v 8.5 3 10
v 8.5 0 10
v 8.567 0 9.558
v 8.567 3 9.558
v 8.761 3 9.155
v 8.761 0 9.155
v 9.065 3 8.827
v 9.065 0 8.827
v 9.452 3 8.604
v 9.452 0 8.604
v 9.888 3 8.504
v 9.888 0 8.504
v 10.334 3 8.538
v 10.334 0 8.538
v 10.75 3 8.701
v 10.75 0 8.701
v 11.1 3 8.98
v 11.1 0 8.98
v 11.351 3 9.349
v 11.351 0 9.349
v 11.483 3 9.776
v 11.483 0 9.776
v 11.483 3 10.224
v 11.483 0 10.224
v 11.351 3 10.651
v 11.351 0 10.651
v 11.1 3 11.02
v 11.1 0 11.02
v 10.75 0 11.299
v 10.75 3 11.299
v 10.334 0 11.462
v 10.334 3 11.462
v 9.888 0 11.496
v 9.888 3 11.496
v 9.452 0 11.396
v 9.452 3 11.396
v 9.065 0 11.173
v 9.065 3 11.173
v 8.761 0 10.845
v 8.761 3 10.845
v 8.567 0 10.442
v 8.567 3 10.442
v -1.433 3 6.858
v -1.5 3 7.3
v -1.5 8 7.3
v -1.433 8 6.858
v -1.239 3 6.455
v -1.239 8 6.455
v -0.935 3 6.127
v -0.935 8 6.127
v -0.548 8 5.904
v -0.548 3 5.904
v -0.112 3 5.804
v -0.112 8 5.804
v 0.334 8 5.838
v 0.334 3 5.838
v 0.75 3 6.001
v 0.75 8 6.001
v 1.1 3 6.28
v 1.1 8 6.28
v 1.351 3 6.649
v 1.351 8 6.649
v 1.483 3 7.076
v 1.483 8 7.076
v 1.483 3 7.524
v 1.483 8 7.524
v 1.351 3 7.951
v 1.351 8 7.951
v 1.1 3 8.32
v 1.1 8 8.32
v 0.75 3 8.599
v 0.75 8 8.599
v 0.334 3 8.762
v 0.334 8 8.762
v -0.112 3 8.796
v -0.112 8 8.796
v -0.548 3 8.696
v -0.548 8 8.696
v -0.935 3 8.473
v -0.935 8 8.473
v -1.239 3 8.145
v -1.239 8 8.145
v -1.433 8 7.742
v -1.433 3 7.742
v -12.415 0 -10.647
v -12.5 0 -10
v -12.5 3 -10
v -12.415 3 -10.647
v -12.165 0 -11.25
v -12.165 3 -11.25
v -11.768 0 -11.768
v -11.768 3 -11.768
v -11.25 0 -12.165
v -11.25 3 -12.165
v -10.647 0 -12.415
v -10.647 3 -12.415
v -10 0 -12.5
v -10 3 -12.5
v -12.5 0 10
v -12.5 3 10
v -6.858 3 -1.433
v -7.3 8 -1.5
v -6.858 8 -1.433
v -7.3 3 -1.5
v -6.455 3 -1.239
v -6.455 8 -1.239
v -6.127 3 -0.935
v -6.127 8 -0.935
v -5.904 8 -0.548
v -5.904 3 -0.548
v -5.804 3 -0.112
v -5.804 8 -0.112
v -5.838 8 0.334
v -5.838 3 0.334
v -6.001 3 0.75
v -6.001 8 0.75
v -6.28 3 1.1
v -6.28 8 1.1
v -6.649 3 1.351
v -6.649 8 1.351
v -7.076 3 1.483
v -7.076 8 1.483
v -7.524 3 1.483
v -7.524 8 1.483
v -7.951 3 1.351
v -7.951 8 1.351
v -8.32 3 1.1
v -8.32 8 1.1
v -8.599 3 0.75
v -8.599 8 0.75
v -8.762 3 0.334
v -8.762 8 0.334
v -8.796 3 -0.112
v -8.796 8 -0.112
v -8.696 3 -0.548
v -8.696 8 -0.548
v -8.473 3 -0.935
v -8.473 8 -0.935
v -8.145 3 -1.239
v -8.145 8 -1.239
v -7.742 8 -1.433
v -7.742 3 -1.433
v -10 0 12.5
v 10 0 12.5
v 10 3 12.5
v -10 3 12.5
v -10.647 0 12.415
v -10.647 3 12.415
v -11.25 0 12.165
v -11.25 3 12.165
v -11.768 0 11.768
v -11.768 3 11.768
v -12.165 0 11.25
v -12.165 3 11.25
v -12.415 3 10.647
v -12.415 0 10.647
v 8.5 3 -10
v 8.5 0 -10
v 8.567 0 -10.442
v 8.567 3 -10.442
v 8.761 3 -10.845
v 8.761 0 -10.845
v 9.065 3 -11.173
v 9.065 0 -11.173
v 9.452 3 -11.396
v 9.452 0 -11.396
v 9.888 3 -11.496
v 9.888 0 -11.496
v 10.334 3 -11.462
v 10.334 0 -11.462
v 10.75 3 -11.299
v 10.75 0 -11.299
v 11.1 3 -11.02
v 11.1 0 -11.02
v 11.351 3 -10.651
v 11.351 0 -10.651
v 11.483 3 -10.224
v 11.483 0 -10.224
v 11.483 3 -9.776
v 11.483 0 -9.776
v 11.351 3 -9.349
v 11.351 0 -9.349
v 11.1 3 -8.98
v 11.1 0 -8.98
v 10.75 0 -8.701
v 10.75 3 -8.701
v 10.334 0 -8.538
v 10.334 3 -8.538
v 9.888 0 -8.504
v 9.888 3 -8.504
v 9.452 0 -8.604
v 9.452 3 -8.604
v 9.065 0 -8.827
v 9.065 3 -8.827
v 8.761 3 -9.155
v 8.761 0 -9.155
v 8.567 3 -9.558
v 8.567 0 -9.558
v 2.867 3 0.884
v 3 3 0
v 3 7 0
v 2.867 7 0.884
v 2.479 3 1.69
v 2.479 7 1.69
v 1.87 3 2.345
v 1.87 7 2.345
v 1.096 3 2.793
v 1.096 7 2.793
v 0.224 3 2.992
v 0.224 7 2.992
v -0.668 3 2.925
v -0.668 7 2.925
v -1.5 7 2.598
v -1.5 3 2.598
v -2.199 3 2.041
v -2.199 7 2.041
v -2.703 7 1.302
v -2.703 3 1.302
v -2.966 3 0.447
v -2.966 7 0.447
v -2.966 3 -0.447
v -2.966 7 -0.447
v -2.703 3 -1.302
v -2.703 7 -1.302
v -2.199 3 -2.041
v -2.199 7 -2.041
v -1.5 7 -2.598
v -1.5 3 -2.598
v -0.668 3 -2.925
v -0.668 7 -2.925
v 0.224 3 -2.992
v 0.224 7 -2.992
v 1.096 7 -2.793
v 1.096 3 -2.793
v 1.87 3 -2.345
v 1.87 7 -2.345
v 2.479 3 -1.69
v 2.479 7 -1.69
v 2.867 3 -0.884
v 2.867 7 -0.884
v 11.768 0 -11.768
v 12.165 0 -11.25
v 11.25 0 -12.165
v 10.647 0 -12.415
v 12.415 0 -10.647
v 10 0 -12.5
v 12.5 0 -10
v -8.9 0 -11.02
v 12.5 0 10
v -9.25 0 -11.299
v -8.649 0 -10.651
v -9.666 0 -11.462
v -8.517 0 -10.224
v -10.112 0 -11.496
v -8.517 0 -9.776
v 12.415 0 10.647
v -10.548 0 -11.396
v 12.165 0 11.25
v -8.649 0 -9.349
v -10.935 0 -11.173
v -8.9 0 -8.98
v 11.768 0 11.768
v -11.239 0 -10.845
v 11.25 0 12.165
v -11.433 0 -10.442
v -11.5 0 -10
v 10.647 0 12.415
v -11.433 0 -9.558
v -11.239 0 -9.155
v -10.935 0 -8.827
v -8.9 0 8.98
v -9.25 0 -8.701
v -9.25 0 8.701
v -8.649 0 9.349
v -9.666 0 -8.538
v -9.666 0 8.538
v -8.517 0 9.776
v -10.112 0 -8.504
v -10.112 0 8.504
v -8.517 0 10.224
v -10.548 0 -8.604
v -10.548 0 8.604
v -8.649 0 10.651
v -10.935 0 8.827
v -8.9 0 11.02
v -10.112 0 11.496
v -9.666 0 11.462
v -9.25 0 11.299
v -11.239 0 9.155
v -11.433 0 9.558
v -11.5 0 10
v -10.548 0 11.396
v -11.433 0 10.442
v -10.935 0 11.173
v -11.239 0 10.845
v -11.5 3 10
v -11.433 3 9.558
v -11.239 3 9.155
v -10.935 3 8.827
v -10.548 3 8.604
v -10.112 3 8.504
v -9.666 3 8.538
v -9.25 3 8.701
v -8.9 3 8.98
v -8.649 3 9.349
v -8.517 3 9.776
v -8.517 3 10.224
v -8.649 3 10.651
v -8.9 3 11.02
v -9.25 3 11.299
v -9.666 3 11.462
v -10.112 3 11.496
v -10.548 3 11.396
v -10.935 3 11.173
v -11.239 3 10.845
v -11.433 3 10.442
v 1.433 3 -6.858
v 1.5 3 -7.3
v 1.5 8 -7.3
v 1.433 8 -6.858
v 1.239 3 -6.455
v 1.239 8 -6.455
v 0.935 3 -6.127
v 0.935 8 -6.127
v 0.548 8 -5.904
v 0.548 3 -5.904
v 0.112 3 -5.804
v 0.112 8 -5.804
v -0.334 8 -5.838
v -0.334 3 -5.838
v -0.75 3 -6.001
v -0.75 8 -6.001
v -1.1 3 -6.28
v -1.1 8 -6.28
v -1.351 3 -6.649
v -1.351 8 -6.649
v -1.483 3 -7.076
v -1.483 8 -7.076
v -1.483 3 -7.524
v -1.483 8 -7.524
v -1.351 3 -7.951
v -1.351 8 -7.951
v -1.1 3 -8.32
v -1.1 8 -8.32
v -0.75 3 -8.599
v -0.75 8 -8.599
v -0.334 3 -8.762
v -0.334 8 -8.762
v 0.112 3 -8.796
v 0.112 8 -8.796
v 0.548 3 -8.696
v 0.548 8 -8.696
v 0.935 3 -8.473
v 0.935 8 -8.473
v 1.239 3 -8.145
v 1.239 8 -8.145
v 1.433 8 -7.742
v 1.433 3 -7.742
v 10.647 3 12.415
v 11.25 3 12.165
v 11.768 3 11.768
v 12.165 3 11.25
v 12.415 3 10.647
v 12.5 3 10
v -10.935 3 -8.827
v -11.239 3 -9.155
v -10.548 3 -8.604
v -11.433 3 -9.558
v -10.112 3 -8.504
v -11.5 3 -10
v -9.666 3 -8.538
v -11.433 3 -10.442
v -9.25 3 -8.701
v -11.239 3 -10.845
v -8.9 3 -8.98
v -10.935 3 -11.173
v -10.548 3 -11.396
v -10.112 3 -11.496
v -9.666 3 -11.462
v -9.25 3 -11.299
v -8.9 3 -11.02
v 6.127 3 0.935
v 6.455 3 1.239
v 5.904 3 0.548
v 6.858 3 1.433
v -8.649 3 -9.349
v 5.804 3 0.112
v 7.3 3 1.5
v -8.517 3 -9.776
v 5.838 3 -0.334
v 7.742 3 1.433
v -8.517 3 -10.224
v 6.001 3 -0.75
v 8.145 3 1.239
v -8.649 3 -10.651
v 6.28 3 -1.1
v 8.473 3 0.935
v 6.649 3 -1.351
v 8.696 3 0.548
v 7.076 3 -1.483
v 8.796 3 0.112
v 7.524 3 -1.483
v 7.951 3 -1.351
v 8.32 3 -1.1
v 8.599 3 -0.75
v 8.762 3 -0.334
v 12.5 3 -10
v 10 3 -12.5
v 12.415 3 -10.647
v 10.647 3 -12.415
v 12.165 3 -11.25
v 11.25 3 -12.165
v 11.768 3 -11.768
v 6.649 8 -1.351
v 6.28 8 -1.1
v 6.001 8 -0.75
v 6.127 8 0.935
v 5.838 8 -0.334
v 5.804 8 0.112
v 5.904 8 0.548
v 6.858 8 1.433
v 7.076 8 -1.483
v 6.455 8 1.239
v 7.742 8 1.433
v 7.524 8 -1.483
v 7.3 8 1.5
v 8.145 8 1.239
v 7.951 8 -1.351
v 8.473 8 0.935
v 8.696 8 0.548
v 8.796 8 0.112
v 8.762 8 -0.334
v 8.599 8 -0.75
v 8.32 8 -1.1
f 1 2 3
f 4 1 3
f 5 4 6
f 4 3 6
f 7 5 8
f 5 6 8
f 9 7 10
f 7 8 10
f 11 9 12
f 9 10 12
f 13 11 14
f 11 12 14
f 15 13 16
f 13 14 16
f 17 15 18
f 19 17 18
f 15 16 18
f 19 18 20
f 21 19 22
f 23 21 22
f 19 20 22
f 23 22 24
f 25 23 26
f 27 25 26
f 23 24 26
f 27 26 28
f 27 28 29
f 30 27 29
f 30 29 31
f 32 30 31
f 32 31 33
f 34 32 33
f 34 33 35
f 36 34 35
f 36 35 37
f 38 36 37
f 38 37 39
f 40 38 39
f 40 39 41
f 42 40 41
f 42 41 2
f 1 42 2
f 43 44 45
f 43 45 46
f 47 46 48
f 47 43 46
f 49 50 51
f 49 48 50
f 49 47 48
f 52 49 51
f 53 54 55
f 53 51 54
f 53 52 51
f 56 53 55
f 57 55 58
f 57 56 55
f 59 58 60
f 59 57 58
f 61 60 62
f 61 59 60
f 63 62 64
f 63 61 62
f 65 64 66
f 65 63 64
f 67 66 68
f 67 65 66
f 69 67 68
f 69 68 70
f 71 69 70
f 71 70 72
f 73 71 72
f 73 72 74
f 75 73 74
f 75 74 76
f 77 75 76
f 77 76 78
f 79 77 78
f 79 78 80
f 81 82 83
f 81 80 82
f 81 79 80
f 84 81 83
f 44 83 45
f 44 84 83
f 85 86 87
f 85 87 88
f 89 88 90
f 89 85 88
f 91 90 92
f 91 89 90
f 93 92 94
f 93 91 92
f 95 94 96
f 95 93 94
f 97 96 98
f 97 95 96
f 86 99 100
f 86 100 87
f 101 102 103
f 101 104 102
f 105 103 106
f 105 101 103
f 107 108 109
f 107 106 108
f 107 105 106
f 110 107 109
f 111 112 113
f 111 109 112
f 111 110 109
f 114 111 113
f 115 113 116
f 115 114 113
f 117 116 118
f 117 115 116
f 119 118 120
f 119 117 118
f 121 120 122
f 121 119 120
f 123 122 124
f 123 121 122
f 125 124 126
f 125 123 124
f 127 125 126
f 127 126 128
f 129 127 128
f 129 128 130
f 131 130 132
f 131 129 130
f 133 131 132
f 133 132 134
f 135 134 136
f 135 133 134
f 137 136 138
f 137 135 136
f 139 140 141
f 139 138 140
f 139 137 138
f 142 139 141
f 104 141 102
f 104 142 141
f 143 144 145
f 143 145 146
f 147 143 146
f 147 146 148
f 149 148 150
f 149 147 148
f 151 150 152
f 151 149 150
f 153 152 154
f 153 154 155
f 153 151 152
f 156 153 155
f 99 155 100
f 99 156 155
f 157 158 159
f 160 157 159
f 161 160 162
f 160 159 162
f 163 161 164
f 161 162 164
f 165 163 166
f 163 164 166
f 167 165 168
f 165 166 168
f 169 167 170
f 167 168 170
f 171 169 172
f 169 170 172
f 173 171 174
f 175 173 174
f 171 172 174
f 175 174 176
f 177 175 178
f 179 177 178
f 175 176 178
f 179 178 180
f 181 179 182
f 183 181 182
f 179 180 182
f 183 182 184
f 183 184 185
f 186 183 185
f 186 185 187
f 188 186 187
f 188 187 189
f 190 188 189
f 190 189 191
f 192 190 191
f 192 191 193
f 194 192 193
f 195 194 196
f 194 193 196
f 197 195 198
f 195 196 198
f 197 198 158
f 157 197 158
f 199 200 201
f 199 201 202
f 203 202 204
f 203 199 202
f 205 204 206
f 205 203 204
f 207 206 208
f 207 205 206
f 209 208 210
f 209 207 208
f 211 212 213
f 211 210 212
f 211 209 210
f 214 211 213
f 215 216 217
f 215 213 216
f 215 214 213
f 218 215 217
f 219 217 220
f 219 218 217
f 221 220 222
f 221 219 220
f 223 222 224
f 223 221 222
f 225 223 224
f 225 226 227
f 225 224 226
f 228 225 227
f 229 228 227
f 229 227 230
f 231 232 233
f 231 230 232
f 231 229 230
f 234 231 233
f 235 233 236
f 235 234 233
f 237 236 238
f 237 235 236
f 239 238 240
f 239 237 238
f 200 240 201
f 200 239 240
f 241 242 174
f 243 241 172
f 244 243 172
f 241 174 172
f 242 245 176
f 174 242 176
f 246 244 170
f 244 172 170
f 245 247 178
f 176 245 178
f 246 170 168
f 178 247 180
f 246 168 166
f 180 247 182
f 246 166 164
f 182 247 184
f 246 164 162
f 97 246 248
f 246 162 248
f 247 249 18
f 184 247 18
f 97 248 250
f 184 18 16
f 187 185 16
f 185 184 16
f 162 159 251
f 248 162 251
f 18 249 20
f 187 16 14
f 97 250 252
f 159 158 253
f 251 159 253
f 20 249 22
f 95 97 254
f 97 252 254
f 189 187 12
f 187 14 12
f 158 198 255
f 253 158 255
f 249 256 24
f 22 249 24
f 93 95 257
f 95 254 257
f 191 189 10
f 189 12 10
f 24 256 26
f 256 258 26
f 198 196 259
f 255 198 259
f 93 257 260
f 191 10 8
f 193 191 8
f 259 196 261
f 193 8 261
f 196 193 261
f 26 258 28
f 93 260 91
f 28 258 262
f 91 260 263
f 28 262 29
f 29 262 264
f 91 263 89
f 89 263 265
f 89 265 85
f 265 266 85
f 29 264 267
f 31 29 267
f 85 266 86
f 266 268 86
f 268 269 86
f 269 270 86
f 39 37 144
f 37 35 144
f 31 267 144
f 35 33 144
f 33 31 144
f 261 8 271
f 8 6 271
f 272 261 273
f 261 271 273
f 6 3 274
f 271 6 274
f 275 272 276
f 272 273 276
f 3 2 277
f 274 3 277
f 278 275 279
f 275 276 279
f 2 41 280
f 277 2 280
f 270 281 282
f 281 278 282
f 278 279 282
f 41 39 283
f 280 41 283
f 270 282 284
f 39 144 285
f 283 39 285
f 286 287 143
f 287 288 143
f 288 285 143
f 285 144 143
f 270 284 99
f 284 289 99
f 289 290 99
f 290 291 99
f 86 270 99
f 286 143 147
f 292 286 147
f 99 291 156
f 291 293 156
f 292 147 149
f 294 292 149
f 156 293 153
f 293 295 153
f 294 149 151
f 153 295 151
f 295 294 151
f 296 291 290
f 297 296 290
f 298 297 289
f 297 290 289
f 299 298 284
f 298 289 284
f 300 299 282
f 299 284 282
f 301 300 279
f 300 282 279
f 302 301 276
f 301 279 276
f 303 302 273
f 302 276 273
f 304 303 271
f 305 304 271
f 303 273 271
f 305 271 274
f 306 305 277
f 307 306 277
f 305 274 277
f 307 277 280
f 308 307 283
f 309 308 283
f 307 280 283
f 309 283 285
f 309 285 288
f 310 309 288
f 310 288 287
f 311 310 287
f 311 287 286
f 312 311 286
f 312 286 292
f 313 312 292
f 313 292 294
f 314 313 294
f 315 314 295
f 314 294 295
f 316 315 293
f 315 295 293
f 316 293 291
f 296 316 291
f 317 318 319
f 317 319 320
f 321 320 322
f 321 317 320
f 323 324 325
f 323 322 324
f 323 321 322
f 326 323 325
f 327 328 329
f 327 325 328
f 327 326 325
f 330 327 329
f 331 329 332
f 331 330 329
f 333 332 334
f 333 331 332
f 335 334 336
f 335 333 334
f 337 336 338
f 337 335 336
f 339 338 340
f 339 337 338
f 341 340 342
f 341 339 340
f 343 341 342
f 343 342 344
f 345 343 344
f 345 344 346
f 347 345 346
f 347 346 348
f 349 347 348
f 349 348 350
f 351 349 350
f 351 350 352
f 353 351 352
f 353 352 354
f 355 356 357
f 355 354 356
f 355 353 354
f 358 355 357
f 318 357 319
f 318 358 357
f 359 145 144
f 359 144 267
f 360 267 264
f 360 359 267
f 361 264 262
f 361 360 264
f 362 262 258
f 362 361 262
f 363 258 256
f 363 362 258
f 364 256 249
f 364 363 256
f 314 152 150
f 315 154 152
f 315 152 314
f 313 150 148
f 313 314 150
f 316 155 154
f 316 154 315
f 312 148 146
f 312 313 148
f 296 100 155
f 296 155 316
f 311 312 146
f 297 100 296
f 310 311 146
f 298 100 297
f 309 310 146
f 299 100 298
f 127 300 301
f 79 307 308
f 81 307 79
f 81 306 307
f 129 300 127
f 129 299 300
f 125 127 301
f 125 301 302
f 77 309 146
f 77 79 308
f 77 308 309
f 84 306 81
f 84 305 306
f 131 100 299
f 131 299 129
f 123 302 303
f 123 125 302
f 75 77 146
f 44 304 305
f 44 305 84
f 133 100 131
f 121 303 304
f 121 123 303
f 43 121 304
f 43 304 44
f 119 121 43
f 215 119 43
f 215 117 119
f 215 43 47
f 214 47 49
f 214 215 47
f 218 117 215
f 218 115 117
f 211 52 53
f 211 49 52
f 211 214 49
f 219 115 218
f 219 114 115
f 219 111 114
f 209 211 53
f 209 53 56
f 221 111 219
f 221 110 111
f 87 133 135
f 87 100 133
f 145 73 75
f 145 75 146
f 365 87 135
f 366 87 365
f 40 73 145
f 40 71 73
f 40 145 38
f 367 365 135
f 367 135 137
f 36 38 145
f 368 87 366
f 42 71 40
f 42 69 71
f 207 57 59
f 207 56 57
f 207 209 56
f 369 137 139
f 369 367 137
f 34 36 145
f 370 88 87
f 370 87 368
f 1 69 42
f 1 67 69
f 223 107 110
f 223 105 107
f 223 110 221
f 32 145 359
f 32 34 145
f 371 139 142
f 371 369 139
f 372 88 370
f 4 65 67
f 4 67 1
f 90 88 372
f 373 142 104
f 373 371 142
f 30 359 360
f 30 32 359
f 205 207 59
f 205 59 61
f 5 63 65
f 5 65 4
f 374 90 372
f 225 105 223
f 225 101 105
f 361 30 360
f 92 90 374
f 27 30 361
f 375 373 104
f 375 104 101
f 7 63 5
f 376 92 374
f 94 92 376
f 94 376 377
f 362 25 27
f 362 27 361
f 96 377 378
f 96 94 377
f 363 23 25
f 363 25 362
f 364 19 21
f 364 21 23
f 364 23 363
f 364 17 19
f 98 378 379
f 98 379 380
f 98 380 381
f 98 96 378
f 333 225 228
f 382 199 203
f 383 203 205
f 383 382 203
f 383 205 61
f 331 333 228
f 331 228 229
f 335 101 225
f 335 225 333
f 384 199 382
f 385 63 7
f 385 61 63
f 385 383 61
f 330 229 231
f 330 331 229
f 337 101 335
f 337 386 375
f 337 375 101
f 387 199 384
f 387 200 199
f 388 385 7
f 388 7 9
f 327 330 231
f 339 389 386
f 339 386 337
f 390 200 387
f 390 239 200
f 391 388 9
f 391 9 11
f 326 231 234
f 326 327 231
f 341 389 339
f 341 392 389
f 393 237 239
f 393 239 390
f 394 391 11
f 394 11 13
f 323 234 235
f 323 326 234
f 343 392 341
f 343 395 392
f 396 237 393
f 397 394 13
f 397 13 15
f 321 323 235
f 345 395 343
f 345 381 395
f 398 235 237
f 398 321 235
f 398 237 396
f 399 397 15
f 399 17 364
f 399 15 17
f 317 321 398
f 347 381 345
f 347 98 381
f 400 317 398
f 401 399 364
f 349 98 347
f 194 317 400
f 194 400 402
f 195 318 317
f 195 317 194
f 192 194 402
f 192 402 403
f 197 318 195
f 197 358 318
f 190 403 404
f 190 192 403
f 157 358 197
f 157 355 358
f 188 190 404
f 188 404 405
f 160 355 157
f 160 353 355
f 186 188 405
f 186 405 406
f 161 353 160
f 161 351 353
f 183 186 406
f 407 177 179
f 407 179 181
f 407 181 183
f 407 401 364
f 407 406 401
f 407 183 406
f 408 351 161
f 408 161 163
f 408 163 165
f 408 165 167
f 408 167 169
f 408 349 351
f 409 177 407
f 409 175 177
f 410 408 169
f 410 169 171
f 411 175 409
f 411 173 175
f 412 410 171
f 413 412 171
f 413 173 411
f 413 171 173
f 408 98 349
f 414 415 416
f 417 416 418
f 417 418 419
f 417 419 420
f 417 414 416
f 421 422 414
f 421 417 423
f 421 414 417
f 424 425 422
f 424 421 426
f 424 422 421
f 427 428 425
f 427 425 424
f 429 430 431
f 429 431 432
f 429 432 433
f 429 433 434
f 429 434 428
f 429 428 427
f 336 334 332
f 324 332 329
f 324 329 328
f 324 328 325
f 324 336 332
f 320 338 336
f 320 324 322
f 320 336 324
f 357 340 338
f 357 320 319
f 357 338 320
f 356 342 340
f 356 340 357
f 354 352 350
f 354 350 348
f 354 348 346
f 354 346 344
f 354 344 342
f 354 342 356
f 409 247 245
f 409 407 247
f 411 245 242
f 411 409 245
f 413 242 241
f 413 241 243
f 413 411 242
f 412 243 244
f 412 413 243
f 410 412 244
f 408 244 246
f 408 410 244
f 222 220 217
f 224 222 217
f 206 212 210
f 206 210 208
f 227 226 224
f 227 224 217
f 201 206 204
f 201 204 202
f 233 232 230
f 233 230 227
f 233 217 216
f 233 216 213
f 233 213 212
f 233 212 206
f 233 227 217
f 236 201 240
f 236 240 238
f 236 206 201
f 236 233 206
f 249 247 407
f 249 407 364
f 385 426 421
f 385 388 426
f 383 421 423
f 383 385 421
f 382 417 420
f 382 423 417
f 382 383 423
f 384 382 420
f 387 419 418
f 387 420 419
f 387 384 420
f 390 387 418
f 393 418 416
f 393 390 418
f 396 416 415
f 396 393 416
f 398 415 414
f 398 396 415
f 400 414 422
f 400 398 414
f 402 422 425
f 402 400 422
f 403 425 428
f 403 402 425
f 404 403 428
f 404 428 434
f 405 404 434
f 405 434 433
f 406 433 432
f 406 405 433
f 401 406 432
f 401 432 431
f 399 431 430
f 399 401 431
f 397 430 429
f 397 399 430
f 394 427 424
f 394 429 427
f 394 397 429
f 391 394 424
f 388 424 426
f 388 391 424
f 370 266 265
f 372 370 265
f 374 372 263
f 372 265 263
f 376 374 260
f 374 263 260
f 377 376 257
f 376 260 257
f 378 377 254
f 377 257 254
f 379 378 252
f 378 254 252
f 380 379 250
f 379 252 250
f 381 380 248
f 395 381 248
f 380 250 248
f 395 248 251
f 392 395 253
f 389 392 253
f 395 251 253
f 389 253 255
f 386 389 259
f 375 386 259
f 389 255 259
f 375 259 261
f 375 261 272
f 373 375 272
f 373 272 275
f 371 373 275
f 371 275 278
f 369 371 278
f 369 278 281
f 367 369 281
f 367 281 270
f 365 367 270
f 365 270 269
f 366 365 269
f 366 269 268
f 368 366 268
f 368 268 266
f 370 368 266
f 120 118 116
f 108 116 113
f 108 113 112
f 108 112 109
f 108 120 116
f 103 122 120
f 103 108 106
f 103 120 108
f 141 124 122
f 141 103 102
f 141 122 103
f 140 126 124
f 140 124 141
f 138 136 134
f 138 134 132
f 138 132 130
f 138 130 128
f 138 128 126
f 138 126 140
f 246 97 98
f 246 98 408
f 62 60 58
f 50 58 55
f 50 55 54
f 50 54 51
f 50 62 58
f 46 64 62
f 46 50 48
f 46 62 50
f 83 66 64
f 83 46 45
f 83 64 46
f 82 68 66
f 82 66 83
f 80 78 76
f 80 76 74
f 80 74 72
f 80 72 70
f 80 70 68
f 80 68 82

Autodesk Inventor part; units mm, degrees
ref_plane "YZ Plane" through (0, 0, 0) normal (1, 0, 0) x (0, 1, 0)
ref_plane "XZ Plane" through (0, 0, 0) normal (0, 1, 0) x (-1, 0, 0)
ref_plane "XY Plane" through (0, 0, 0) normal (0, 0, 1) x (1, 0, 0)
sketch "Sketch1" plane through (0, 0, 0) normal (0, 1, 0) x (-1, 0, 0)
  line L0 (-12.5, 12.5) -> (12.5, 12.5)
  line L1 (12.5, 12.5) -> (12.5, -12.5)
  line L2 (12.5, -12.5) -> (-12.5, -12.5)
  line L3 (-12.5, -12.5) -> (-12.5, 12.5)
  line L4 (-12.5, 12.5) -> (12.5, -12.5) construction
  line L5 (12.5, 12.5) -> (-12.5, -12.5) construction
  line L6 (-10, 10) -> (10, 10) construction
  line L7 (10, 10) -> (10, -10) construction
  line L8 (10, -10) -> (-10, -10) construction
  line L9 (-10, -10) -> (-10, 10) construction
  line L10 (-10, 10) -> (10, -10) construction
  line L11 (10, 10) -> (-10, -10) construction
  circle A0 centre (10, 10) radius 1.5
  circle A1 centre (10, -10) radius 1.5
  circle A2 centre (-10, -10) radius 1.5
  circle A3 centre (-10, 10) radius 1.5
  point P0 (0, 0)
  dimension "d0" = 25
  dimension "d1" = 25
  dimension "d2" = 3
  dimension "d3" = 3
  dimension "d4" = 3
  dimension "d5" = 3
  dimension "d6" = 20
extrude "Extrusion1" add sketch "Sketch1" along normal blind 3
sketch "Sketch2" plane through (0, 3, 0) normal (0, 1, 0) x (1, 0, 0)
  circle A0 centre (0, 0) radius 3
  circle A1 centre (-5.5, 0) radius 1.5
  circle A2 centre (-2.75, -4.7631) radius 1.5
  circle A3 centre (2.75, -4.7631) radius 1.5
  circle A4 centre (5.5, 0) radius 1.5
  circle A5 centre (2.75, 4.7631) radius 1.5
  circle A6 centre (-2.75, 4.7631) radius 1.5
  dimension "d9" = 6
  dimension "d10" = 3
  dimension "d11" = 5.5
  dimension "d14" = 360
extrude "Extrusion2" add sketch "Sketch2" along normal blind 5 contours A1 | A2 | A3 | A4 | A5 | A6
sketch "Sketch3" plane through (0, 3, 0) normal (0, 1, 0) x (1, 0, 0)
  circle A0 centre (0, 0) radius 3
  dimension "d18" = 6
extrude "Extrusion3" add sketch "Sketch3" along normal blind 4
sketch "Sketch5" plane through (-5.5, 8, 0) normal (0, 1, 0) x (1, 0, 0)
  circle A0 centre (0, 0) radius 2.5
  circle A1 centre (2.75, -4.7631) radius 2.5
  circle A2 centre (8.25, -4.7631) radius 2.5
  circle A3 centre (11, 0) radius 2.5
  circle A4 centre (8.25, 4.7631) radius 2.5
  circle A5 centre (2.75, 4.7631) radius 2.5
  circle A6 centre (5.5, 0) radius 3.5
  circle A7 centre (0, 0) radius 1.4875
  circle A8 centre (2.75, -4.7631) radius 1.4875
  circle A9 centre (8.25, -4.7631) radius 1.4875
  circle A10 centre (11, 0) radius 1.4875
  circle A11 centre (8.25, 4.7631) radius 1.4875
  circle A12 centre (2.75, 4.7631) radius 1.4875
  line L0 (18, 12.5) -> (-7, 12.5) projected
  line L1 (18, -12.5) -> (-7, -12.5)
  line L2 (-7, -12.5) -> (-7, 12.5)
  line L3 (-7, 12.5) -> (18, 12.5)
  line L4 (18, 12.5) -> (18, -12.5)
  line L5 (18, -12.5) -> (-7, 12.5) construction
  line L6 (-7, -12.5) -> (18, 12.5) construction
  circle A13 centre (-4.5, -10) radius 1.5 projected
  circle A14 centre (-4.5, -10) radius 1.65
  circle A15 centre (-4.5, 10) radius 1.5 projected
  circle A16 centre (-4.5, 10) radius 1.65
  circle A17 centre (15.5, 10) radius 1.5 projected
  circle A18 centre (15.5, 10) radius 1.65
  circle A19 centre (15.5, -10) radius 1.5 projected
  circle A20 centre (15.5, -10) radius 1.65
  point P0 (8.7955, -1.179)
  point P1 (8.1687, -2.2645)
  point P2 (6.1267, -3.4434)
  point P3 (4.8733, -3.4434)
  point P4 (2.8313, -2.2645)
  point P5 (2.2045, -1.179)
  point P6 (2.2045, 1.179)
  point P7 (2.8313, 2.2645)
  point P8 (4.8733, 3.4434)
  point P9 (6.1267, 3.4434)
  point P10 (8.1687, 2.2645)
  point P11 (8.7955, 1.179)
  dimension "d21" = 5
  dimension "d24" = 360
  dimension "d26" = 7
  dimension "d29" = 360
extrude "Extrusion4" add sketch "Sketch5" against normal blind 5 contours L4 L1 L2 L0 | A14 | A16 | A18 | A20
fillet "Fillet1" radius 0.5 12 edges at (-2.6687, 5.5, 2.2645) (-0.6267, 5.5, 3.4434) (2.6687, 5.5, 2.2645) (0.6267, 5.5, 3.4434) (-3.2955, 5.5, -1.179) (-3.2955, 5.5, 1.179) (-0.6267, 5.5, -3.4434) (-2.6687, 5.5, -2.2645) (2.6687, 5.5, -2.2645) (0.6267, 5.5, -3.4434) (3.2955, 5.5, 1.179) (3.2955, 5.5, -1.179)
fillet "Fillet2" radius 2.5 4 edges at (12.5, 4, -12.5) (-12.5, 4, -12.5) (12.5, 4, 12.5) (-12.5, 4, 12.5)
sketch "Sketch7" plane through (0, 7, 0) normal (0, 1, 0) x (1, 0, 0)
  circle A0 centre (0, 0) radius 1
extrude "Extrusion5" [suppressed]
sketch "Sketch8" plane through (-5.5, 8, 0) normal (0, 1, 0) x (1, 0, 0)
  circle A0 centre (0, 0) radius 1
  point P0 (5.5, 0)
  dimension "d37" = 2
extrude "Extrusion6" [suppressed]
pattern_circular "Circular Pattern1" [suppressed]
sketch "Sketch9" plane through (-5.5, 8, 0) normal (0, 1, 0) x (1, 0, 0)
  line L0 (-7.0276, -1) -> (-2, -1)
  line L1 (-2, -1) -> (-2, 1)
  line L2 (-2, 1) -> (-7.0276, 1)
  line L3 (-7.0276, 1) -> (-7.0276, -1)
  line L4 (-7.0276, -1) -> (-2, 1) construction
  line L5 (-2, -1) -> (-7.0276, 1) construction
  point P0 (5.5, 0)
  point P1 (-4.5138, 0)
extrude "Extrusion7" cut sketch "Sketch9" against normal blind 5
thicken "Thicken1" operation add thickness 5 both sides no extend neighbours yes toward (0, -1, 0) faces at (0.7594, 8, 10.7394)
sketch "Sketch10" plane through (5.5, 8, 0) normal (0, 1, 0) x (1, 0, 0)
  circle A0 centre (-5.5, 0) radius 3.2016
  circle A1 centre (-5.5, 0) radius 8.2006
extrude "Extrusion8" cut sketch "Sketch10" against normal blind 5
sketch "Sketch12" plane through (-10, 3, 12.5) normal (0, 1, 0) x (1, 0, 0)
  circle A0 centre (10, 12.5) radius 7.3 construction
  circle A1 centre (10, 19.8) radius 1.5
  dimension "d49" = 14.6
  dimension "d50" = 3
extrude "Extrusion9" add sketch "Sketch12" along normal blind 5
pattern_circular "Circular Pattern2" count 4 over 360 about axis through (0, 3, 0) along (0, 1, 0) of "Extrusion9"
properties part number "PDMS stretcher mould A (x4)"
